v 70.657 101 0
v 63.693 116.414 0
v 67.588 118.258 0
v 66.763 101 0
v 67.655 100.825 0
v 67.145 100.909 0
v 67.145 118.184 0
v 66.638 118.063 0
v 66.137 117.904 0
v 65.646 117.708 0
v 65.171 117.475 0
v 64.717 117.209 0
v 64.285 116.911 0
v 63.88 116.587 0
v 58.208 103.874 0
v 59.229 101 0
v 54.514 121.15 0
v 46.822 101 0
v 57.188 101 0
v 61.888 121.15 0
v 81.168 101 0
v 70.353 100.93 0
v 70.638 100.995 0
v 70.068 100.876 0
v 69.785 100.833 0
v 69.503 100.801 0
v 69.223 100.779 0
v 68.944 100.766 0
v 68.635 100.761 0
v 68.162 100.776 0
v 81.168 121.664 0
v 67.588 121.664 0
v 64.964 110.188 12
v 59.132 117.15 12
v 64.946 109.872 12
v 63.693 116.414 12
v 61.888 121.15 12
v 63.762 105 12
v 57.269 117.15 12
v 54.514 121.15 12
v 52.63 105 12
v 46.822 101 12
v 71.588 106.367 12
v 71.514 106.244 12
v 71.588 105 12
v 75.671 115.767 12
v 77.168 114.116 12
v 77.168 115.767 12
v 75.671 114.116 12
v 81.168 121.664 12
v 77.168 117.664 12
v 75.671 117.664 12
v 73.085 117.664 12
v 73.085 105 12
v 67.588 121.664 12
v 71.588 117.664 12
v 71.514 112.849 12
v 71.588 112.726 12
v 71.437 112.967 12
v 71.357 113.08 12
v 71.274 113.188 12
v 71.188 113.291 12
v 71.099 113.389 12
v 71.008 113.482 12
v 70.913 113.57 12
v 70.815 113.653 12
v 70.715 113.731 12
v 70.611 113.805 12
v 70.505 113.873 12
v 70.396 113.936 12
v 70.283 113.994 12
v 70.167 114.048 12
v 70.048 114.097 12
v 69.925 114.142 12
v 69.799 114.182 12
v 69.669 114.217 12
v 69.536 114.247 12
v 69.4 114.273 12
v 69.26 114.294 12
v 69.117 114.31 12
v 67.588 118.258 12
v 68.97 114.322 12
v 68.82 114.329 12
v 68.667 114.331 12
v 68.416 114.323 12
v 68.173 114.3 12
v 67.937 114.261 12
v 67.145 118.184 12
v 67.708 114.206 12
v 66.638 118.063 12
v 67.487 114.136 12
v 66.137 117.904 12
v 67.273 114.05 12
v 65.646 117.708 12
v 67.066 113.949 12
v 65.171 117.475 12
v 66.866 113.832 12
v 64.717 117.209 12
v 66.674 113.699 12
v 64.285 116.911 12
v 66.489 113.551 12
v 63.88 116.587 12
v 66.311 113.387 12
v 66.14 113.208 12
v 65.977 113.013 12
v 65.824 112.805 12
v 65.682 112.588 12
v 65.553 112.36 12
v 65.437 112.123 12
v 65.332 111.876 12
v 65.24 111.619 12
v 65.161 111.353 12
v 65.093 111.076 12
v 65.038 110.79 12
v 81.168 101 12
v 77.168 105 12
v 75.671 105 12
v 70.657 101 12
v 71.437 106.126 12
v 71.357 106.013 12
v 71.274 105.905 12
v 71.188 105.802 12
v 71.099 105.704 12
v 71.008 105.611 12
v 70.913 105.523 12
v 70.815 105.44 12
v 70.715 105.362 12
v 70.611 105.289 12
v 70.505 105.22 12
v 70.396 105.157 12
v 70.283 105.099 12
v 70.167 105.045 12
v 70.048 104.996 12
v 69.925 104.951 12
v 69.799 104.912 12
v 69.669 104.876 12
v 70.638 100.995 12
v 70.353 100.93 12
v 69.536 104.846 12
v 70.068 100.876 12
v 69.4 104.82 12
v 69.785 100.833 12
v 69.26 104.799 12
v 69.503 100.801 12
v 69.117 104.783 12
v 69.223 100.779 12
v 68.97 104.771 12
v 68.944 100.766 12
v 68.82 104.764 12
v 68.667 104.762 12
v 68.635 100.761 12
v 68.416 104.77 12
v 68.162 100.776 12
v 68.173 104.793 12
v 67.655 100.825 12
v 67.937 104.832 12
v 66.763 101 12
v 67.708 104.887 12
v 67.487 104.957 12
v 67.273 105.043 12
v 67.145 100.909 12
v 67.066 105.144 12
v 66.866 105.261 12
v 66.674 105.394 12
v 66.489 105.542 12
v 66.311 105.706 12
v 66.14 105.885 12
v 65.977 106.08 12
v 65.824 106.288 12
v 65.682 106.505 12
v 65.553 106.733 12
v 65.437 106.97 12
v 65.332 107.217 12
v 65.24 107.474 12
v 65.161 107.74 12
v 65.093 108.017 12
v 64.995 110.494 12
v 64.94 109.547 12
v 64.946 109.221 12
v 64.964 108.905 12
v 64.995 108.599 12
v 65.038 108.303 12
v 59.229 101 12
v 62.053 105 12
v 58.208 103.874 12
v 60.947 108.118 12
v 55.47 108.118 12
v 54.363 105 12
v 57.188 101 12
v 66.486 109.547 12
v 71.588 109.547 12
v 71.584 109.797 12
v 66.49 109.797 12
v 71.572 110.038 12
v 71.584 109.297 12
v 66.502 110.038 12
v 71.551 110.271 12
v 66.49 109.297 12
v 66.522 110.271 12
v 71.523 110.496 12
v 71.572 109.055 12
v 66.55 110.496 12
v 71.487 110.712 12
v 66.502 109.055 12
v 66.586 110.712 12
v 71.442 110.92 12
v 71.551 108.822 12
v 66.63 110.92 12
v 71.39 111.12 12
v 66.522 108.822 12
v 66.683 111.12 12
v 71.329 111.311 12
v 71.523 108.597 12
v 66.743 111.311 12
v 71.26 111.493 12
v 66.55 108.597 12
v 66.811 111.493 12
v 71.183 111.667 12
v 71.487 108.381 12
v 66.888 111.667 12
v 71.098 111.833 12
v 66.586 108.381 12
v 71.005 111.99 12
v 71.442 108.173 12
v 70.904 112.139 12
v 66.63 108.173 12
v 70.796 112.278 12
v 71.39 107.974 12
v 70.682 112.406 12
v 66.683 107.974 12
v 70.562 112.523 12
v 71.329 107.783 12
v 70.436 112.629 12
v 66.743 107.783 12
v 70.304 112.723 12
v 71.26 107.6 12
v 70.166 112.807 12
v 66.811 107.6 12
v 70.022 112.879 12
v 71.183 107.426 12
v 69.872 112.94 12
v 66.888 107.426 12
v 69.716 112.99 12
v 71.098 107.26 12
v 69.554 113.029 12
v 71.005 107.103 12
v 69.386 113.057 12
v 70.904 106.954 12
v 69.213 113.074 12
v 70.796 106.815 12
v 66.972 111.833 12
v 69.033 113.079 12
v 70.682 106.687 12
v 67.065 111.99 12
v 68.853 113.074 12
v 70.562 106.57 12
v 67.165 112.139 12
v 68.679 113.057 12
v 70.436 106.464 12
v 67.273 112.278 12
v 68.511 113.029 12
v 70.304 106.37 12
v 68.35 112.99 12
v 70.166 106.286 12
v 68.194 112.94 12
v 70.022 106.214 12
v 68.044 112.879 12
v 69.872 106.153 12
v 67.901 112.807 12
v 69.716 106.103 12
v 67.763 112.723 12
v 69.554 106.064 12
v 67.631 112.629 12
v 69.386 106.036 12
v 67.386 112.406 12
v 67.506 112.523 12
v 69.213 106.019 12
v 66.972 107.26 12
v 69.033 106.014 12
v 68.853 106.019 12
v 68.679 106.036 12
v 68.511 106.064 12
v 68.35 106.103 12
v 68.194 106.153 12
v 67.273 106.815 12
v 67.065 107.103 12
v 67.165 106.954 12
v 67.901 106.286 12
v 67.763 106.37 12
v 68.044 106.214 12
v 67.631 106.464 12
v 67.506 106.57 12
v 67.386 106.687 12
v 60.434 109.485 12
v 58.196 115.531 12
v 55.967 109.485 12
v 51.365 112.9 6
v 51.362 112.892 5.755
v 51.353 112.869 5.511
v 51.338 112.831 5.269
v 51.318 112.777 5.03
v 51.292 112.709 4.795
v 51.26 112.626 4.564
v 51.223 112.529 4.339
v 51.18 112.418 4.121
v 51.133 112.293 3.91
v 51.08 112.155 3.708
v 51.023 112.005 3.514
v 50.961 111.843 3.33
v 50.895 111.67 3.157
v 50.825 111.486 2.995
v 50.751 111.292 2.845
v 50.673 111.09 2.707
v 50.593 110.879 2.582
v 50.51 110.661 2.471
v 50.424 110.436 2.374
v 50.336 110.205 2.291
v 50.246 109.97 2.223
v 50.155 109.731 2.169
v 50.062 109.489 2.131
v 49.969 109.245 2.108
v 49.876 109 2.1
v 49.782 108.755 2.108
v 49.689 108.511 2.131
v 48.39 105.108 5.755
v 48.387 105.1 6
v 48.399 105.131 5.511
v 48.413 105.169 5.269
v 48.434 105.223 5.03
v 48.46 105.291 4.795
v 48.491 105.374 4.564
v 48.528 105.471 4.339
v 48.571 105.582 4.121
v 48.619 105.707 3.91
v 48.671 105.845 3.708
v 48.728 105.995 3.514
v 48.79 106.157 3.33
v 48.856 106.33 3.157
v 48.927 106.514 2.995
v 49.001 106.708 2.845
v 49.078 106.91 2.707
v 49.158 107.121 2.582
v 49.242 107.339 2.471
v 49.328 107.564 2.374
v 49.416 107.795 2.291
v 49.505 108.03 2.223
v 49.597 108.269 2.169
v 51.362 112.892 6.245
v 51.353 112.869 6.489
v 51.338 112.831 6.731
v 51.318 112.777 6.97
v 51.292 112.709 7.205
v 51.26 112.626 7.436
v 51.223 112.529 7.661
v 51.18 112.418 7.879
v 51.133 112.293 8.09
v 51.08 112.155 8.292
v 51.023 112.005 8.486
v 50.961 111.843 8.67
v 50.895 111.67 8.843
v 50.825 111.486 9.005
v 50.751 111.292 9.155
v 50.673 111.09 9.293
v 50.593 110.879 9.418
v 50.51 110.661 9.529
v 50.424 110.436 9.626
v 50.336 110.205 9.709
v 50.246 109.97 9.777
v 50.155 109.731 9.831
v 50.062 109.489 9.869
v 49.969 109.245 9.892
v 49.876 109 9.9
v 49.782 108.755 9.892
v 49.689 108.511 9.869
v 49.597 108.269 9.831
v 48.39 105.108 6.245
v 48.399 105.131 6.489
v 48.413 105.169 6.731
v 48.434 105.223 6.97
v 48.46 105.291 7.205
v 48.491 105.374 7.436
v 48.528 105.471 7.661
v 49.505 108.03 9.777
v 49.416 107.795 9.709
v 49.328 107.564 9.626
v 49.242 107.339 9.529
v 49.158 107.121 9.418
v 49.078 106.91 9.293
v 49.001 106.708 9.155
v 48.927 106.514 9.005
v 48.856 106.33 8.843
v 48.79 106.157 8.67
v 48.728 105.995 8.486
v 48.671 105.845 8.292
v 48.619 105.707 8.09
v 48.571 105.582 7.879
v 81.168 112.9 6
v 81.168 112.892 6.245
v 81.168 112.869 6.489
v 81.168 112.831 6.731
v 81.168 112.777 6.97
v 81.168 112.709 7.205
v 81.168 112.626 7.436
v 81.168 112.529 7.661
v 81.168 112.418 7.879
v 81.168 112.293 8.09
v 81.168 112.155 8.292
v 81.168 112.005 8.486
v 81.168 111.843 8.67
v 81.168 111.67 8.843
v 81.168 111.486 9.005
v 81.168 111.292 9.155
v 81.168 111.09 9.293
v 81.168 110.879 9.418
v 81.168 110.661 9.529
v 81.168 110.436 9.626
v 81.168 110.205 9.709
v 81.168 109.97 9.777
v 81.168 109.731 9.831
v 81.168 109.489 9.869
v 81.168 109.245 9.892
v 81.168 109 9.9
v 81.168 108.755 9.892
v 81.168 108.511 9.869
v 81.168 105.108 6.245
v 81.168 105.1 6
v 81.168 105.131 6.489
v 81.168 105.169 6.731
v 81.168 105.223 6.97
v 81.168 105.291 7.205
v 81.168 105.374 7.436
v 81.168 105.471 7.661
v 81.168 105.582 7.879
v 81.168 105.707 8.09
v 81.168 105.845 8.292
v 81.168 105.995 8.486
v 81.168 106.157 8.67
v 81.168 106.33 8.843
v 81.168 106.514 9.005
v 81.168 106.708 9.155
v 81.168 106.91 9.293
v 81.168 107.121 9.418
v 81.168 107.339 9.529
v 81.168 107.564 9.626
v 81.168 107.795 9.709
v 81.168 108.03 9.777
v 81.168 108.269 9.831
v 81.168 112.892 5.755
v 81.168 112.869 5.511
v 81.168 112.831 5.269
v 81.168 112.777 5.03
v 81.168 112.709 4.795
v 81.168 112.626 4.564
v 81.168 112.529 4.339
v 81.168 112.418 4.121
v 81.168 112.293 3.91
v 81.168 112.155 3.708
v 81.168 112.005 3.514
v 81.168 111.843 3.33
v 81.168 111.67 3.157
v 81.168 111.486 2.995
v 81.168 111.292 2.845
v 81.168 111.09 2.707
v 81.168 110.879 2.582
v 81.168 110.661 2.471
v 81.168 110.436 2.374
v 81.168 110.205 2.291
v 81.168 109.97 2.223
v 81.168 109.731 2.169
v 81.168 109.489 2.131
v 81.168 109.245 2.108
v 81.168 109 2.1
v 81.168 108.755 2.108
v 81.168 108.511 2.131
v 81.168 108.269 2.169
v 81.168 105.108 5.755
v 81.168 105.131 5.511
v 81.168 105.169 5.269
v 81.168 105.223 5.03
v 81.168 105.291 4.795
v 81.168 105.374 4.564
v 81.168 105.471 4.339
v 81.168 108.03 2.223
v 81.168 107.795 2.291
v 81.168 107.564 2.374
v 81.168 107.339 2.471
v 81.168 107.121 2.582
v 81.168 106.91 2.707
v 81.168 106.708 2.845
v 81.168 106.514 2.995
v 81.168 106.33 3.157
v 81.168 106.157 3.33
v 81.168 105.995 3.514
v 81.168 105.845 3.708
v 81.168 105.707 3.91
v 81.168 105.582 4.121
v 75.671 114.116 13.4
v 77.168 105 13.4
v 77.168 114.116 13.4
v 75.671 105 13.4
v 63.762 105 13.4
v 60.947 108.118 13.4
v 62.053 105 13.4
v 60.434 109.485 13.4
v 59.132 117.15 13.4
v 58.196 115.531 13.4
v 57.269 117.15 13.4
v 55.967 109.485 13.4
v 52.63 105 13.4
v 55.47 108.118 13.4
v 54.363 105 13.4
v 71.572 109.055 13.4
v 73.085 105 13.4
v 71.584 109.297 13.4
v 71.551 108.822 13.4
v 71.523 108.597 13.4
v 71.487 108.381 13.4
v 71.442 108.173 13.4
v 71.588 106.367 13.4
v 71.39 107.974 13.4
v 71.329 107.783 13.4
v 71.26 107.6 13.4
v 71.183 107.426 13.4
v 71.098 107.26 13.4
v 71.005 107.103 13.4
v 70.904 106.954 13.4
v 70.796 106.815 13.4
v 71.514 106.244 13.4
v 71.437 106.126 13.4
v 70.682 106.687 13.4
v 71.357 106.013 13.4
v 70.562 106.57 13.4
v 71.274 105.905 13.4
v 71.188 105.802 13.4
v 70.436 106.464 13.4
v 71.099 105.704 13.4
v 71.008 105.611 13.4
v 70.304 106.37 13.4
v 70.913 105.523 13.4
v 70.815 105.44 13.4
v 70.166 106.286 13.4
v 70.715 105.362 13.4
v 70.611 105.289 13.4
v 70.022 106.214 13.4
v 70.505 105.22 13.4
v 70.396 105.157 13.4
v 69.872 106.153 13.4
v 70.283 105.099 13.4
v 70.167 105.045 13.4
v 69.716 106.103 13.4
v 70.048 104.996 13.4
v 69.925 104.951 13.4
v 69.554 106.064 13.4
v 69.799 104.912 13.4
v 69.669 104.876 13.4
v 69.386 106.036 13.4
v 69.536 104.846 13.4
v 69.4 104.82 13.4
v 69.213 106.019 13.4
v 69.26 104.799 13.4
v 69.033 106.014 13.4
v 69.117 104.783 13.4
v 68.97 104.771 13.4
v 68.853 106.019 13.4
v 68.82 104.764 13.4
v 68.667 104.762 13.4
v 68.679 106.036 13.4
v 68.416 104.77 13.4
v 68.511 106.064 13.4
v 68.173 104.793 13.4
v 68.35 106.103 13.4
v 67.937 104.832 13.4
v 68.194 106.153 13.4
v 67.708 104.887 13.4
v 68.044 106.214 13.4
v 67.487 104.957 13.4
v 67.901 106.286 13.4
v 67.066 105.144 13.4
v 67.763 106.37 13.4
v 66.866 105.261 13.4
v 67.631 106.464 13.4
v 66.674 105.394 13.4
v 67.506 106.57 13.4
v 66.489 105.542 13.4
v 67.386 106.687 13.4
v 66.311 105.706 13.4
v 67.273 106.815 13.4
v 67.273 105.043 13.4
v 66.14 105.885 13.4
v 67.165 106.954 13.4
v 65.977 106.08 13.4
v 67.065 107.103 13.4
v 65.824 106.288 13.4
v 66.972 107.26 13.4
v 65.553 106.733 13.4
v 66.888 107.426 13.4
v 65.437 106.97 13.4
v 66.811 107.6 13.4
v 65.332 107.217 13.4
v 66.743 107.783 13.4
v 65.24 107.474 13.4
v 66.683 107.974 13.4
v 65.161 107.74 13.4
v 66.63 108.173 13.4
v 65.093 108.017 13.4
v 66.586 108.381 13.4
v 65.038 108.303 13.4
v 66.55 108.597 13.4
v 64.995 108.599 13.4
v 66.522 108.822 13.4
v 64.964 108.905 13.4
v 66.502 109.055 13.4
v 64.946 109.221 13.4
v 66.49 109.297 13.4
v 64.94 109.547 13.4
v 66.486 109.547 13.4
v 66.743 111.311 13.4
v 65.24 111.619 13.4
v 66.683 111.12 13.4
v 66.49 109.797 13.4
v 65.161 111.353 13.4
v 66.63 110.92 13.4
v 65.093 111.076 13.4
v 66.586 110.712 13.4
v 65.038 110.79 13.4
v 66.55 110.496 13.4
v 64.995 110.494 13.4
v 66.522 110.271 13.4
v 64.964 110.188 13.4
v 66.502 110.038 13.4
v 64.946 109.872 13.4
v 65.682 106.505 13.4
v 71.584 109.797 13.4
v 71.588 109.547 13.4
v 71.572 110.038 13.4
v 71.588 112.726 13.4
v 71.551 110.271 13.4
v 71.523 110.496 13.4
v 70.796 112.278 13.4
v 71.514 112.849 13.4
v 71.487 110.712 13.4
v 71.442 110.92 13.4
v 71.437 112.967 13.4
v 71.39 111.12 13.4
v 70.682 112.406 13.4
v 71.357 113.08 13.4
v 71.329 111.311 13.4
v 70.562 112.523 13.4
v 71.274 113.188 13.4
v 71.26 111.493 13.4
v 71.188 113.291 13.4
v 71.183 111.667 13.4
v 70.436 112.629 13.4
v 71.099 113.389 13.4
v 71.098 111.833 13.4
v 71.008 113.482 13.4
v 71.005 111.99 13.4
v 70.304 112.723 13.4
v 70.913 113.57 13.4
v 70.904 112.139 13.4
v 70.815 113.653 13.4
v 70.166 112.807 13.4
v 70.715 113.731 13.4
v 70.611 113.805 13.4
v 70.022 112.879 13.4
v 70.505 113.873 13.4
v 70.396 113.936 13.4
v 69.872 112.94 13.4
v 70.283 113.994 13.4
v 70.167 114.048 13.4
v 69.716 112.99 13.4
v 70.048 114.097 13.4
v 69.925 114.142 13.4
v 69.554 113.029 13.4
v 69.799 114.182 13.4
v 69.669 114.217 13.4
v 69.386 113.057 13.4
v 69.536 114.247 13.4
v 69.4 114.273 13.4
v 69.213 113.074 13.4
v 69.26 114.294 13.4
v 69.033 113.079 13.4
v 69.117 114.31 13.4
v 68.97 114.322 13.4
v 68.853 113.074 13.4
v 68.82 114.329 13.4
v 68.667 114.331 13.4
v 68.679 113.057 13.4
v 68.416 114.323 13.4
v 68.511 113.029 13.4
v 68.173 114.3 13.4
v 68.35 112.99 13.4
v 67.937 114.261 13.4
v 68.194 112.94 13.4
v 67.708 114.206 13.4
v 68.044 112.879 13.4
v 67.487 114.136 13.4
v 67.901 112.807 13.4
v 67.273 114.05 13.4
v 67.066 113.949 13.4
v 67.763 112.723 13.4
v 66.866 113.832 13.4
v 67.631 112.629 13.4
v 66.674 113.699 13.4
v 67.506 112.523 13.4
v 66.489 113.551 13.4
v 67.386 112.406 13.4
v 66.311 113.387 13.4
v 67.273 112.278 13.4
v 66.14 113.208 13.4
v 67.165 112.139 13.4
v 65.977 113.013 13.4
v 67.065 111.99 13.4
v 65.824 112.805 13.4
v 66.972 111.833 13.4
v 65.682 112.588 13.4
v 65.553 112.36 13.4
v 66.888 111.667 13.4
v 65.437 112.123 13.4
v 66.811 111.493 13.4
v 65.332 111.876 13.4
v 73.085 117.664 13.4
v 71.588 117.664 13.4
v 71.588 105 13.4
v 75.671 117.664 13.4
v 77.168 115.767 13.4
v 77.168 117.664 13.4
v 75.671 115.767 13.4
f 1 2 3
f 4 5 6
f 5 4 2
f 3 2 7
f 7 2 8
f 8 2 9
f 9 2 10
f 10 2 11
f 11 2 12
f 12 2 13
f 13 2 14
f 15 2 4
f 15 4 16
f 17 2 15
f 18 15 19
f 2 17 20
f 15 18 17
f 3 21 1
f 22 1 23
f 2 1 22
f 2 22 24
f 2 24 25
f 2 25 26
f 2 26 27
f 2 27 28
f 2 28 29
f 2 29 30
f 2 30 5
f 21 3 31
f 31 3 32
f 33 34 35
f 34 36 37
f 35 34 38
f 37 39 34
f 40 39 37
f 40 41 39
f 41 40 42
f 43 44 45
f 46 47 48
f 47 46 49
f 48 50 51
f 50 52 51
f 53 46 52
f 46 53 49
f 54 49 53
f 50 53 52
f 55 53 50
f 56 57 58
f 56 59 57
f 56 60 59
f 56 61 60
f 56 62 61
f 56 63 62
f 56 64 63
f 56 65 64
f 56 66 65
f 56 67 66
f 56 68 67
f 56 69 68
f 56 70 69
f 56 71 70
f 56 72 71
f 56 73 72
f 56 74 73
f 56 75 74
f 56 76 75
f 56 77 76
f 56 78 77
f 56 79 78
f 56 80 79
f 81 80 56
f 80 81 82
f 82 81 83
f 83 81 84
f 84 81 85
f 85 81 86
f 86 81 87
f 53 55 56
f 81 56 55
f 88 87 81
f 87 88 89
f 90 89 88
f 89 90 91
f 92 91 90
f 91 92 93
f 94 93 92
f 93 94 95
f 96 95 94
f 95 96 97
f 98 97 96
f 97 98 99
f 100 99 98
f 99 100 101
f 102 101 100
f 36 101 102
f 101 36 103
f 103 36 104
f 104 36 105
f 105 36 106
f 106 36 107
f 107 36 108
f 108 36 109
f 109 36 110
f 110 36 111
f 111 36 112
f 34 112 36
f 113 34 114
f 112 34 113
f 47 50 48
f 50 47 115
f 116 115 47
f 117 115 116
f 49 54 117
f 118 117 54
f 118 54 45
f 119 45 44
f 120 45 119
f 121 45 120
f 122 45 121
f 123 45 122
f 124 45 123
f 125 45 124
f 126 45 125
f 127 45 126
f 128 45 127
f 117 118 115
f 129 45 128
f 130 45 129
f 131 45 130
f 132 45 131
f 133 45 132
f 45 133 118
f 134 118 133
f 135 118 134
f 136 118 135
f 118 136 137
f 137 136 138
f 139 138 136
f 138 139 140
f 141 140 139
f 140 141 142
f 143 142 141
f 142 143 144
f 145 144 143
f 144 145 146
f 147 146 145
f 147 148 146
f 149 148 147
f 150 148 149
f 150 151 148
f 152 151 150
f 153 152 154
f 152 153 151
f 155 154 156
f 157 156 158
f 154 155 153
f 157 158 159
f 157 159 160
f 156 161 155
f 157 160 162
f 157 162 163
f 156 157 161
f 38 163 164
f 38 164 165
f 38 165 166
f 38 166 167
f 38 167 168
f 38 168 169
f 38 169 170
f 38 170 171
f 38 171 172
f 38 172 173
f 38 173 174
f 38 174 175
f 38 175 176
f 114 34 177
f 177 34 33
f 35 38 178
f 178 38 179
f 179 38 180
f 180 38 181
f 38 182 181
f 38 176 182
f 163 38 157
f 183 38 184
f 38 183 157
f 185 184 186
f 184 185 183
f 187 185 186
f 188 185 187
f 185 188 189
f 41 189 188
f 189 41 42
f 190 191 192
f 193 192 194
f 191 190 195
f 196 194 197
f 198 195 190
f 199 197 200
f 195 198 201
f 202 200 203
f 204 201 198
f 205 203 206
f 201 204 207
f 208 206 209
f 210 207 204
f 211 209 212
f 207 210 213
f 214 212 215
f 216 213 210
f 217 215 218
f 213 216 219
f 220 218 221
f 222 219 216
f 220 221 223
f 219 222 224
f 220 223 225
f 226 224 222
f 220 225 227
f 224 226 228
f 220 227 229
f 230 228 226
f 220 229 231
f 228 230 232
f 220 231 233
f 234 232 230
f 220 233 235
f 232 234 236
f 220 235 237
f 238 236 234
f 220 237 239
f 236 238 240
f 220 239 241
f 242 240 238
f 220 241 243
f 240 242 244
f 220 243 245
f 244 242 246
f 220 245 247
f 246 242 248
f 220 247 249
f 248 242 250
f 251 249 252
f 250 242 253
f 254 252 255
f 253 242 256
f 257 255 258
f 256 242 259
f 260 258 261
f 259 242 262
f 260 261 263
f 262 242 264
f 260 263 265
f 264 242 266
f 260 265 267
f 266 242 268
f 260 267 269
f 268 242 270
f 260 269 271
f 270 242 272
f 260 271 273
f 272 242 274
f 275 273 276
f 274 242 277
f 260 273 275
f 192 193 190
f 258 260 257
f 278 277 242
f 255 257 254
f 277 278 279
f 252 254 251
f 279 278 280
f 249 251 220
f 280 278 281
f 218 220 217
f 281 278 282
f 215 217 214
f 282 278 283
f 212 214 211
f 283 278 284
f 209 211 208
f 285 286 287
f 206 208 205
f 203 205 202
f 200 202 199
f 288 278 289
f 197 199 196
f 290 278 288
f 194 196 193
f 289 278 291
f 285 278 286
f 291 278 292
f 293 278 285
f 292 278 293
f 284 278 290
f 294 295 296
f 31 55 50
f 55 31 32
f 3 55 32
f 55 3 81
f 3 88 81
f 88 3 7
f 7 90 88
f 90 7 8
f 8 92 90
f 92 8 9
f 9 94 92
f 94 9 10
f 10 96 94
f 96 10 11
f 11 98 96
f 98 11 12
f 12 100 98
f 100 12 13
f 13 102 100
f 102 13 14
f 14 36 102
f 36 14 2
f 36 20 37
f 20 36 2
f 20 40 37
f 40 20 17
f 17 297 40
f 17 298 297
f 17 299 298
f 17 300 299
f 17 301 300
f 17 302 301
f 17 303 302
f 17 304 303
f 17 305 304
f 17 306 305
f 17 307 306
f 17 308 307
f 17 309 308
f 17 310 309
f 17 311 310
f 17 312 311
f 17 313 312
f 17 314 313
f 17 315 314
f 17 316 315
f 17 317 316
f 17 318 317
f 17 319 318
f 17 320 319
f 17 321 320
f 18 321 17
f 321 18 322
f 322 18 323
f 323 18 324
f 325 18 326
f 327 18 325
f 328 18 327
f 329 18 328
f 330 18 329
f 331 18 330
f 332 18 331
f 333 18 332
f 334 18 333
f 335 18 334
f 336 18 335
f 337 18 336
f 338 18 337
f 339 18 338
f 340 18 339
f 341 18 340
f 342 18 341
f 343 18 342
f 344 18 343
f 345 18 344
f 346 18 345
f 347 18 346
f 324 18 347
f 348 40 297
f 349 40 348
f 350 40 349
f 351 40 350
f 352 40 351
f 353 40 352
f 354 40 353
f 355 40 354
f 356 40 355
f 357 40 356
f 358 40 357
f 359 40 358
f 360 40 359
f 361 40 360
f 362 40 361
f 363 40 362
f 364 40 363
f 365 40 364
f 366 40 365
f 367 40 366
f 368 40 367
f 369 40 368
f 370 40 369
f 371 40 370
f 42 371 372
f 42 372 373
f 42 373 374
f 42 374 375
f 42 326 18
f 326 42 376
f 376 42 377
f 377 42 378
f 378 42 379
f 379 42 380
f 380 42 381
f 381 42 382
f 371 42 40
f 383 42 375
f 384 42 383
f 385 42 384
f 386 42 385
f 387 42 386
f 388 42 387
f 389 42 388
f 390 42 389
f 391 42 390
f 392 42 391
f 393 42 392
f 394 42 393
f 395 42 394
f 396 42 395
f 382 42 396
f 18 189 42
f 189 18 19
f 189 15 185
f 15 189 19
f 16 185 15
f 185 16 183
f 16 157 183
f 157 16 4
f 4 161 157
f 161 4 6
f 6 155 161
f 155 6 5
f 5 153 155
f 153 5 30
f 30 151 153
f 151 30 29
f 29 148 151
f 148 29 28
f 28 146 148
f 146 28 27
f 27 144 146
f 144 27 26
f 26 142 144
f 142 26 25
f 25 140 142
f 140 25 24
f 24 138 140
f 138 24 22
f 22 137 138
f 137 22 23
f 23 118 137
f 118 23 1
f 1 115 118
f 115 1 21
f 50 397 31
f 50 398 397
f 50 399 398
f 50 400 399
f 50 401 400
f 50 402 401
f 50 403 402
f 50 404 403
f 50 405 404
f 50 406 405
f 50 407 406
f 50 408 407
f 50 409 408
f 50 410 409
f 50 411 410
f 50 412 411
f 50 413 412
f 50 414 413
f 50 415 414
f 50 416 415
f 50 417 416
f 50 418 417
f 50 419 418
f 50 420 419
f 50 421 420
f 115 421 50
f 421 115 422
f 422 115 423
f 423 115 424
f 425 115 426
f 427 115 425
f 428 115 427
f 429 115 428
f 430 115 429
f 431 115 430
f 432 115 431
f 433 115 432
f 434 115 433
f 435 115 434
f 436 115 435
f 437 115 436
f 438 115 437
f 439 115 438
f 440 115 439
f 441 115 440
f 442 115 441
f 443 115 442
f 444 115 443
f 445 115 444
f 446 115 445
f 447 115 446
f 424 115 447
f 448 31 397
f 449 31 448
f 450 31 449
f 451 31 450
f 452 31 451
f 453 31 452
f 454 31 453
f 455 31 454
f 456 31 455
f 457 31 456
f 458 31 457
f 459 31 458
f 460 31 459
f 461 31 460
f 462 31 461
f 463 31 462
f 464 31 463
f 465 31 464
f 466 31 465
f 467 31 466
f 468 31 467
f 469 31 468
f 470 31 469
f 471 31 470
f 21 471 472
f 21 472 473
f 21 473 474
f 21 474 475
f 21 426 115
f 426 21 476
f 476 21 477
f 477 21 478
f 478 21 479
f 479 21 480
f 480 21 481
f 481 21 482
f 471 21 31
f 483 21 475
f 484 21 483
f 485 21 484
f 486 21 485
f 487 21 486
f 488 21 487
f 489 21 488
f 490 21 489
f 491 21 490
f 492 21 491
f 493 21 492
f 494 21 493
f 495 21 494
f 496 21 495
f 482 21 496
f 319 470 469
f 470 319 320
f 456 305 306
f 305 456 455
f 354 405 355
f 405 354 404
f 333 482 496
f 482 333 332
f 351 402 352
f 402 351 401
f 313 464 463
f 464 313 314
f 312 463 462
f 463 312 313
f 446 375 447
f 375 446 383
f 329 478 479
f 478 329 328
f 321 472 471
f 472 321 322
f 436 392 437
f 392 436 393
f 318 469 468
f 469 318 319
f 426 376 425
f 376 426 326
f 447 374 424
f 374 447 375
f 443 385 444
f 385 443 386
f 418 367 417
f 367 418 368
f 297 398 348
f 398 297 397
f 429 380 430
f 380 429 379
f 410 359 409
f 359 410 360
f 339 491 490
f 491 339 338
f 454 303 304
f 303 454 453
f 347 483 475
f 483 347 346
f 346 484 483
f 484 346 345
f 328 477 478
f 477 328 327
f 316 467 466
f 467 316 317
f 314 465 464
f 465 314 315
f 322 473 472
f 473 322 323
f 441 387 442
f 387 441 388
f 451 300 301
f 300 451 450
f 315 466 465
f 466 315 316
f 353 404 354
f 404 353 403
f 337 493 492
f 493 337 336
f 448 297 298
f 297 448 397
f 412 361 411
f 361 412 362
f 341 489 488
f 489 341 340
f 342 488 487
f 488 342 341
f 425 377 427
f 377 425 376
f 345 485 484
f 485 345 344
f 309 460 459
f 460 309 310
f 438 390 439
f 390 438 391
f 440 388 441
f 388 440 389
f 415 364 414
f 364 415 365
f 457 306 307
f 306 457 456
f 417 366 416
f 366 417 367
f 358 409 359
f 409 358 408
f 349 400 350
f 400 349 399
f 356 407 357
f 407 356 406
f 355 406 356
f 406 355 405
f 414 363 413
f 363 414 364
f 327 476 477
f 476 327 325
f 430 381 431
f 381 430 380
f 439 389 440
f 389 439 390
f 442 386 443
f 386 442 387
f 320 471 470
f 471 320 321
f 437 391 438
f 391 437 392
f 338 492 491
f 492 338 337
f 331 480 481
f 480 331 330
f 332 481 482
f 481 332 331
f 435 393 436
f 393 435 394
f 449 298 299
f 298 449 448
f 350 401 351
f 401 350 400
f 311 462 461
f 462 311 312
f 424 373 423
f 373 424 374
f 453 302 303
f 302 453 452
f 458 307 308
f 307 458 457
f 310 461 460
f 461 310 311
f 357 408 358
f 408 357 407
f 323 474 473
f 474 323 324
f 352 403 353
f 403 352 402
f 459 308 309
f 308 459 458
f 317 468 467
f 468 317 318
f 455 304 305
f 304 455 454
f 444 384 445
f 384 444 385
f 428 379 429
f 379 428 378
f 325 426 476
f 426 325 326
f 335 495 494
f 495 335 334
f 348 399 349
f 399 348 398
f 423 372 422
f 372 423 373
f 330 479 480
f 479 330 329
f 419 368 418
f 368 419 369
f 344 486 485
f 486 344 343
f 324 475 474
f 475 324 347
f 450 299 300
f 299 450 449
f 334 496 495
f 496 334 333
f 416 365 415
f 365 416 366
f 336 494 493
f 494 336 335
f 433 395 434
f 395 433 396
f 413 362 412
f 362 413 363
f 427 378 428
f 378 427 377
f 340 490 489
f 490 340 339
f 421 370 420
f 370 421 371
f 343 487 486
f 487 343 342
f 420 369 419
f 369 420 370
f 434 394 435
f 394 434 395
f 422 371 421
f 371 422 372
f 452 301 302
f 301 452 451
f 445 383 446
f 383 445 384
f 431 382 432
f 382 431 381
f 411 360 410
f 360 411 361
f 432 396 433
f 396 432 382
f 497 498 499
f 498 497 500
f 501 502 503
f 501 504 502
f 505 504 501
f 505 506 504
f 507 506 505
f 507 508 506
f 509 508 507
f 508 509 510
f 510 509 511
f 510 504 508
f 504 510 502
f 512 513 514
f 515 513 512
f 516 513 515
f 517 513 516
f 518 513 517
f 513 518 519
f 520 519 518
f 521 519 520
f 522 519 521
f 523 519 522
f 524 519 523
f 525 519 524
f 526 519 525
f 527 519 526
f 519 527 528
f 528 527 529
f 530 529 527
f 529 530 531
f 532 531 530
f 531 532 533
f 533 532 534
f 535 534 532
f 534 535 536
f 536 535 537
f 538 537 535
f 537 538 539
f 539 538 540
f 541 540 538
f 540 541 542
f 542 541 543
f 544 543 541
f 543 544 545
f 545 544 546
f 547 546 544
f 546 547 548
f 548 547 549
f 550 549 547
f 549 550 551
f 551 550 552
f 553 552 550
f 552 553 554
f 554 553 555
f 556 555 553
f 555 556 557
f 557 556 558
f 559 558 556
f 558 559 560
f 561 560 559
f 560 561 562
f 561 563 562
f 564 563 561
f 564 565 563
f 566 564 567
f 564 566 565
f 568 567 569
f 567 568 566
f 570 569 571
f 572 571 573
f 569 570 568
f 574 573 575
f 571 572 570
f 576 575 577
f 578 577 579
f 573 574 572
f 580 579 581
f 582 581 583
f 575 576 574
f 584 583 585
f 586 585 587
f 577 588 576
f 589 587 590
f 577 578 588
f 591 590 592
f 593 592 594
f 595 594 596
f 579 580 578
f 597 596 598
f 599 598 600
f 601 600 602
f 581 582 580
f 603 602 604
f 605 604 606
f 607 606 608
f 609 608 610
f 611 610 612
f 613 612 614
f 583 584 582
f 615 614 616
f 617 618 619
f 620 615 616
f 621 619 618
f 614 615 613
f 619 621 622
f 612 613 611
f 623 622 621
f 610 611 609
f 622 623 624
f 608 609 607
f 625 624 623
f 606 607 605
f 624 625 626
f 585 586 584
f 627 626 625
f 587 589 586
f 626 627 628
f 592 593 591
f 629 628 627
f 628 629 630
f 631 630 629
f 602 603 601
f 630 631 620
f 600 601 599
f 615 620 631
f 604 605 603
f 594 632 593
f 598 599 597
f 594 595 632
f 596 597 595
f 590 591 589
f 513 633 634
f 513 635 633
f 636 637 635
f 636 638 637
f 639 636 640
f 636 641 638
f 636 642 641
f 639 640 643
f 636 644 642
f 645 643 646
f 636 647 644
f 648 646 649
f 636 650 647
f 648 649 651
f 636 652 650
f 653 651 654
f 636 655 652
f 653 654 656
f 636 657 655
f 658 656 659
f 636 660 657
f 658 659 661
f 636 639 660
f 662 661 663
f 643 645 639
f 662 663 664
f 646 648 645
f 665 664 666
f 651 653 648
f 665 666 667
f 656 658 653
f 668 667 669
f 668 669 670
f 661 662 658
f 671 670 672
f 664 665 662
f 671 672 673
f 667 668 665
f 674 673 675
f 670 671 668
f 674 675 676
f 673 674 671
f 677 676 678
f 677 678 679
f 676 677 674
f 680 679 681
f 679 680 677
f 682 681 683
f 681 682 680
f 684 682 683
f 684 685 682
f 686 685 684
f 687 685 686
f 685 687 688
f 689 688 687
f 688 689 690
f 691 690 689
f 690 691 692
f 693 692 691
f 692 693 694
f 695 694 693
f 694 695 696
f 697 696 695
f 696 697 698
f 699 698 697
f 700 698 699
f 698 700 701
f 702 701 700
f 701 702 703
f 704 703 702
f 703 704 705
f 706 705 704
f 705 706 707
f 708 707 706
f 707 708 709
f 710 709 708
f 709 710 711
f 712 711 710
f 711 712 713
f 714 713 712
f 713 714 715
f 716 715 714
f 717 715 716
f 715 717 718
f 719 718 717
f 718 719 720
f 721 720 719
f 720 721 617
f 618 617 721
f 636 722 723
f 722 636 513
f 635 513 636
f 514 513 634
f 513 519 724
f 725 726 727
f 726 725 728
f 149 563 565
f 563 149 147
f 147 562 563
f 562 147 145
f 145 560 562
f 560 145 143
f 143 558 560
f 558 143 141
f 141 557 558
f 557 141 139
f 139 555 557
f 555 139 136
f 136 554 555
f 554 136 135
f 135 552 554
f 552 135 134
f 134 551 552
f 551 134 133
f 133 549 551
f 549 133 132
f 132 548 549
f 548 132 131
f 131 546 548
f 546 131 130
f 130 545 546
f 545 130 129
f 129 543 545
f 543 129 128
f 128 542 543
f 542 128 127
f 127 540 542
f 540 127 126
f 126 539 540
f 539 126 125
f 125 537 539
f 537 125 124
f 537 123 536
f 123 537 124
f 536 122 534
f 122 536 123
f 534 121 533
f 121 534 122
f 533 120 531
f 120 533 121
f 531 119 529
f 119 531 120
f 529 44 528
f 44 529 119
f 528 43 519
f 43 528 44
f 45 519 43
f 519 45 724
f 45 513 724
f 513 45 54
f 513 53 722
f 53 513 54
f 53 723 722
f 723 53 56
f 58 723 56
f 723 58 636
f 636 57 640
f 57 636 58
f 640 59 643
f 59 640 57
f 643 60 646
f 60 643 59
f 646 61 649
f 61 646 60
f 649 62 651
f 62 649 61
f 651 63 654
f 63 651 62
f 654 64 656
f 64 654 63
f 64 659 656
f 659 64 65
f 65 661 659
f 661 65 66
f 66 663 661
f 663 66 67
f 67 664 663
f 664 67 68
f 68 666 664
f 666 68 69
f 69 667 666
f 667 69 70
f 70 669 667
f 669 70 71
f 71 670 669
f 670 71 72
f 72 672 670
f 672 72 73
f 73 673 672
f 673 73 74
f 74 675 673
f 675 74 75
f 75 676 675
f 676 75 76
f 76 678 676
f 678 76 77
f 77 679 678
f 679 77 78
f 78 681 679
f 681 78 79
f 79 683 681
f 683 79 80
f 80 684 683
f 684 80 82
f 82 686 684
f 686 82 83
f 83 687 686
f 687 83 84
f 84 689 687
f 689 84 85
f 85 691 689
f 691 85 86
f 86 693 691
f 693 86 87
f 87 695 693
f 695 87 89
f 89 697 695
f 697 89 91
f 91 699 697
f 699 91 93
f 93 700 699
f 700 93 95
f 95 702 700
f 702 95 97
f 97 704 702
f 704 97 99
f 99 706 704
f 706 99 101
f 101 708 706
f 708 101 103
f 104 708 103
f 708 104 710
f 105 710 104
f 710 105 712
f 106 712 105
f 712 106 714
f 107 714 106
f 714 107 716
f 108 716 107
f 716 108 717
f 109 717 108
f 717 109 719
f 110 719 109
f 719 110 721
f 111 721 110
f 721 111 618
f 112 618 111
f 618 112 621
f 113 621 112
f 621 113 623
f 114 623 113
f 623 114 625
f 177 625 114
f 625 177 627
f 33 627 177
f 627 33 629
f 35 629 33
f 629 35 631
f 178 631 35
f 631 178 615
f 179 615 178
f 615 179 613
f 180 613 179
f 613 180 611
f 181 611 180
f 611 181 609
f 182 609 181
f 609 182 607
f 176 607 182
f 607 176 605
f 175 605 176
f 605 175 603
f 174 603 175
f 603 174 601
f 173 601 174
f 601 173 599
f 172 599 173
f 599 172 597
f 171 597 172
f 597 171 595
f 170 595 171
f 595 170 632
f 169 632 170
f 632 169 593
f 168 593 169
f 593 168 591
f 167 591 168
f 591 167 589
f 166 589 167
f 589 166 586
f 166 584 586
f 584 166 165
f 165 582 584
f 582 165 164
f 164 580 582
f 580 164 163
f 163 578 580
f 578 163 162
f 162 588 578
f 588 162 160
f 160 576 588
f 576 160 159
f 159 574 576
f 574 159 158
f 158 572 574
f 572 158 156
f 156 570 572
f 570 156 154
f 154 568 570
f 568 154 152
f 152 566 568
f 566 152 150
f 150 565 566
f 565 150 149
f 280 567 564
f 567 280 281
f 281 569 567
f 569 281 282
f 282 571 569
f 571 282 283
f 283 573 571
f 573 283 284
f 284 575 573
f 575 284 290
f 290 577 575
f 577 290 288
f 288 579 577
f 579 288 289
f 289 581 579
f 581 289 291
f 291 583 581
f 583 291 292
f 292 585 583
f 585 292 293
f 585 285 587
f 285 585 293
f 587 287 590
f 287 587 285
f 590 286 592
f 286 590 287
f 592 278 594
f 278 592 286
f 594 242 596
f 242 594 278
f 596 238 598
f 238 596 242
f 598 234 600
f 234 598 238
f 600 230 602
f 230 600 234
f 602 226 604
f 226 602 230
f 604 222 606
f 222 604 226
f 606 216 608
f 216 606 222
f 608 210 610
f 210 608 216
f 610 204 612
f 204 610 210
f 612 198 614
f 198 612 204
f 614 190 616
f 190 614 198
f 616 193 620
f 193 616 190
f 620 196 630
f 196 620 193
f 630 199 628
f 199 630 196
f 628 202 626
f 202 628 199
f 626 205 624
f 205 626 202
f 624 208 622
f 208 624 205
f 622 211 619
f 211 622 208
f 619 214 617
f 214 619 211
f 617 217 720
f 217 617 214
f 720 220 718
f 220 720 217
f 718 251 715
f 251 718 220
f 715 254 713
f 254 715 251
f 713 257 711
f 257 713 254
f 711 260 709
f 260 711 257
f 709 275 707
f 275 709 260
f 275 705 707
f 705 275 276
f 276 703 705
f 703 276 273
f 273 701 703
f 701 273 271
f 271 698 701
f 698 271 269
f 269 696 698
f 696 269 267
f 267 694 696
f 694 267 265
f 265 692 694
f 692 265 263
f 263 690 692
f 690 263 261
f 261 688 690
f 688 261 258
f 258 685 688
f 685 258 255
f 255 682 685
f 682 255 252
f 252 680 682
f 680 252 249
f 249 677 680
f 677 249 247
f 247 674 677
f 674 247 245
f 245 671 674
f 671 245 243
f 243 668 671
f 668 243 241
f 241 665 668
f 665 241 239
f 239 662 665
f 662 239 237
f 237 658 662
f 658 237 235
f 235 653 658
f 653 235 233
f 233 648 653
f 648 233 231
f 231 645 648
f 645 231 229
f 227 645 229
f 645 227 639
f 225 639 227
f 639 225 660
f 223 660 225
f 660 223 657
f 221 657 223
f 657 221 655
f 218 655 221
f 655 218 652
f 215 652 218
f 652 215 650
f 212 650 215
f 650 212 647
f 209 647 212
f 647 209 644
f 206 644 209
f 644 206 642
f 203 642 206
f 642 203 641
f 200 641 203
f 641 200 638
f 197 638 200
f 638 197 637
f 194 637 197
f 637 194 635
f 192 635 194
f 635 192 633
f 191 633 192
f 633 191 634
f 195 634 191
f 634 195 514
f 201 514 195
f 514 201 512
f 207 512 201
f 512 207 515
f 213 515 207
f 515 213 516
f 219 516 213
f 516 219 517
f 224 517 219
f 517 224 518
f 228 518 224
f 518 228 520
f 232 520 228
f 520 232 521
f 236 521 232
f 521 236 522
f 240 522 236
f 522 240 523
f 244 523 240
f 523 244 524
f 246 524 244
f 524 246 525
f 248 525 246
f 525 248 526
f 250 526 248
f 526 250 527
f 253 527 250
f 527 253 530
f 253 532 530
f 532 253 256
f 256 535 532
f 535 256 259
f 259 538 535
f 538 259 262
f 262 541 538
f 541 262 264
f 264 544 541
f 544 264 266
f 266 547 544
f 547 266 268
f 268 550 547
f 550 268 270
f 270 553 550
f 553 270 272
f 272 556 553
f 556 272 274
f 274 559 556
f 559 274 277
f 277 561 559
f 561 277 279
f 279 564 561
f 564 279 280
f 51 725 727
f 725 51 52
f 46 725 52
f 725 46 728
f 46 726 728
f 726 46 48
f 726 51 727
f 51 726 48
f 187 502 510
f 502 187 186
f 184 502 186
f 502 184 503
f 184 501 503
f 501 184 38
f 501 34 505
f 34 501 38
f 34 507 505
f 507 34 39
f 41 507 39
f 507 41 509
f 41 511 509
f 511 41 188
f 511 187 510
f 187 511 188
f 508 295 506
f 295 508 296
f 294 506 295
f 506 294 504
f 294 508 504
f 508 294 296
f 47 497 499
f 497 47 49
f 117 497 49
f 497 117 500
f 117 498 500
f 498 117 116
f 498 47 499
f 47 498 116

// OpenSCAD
// =========================================================================
//   MULTI-NAME TOPPER COMBINED VERSION (Auto-detect Ligatures + Calibrated Spacing)
// =========================================================================
// Jumlah kolom grid
grid_cols = 2;
/* [Nama] */
nama_1  = "Adi";
nama_2  = "";
nama_3  = "";
nama_4  = "";
nama_5  = "";
nama_6  = "";
nama_7  = "";
nama_8  = "";
nama_9  = "";
nama_10 = "";

/* [Warna] */
base_color_name    = "Peak Green"; // [Yellow, White, Sky Blue, Red, Peak Green, Orange, Grape Purple, Black, Beige, Barbie Pink]
letters_color_name = "White";      // [Yellow, White, Sky Blue, Red, Peak Green, Orange, Grape Purple, Black, Beige, Barbie Pink]

/* [Settings] */
font_name        = "Bagel Fat One"; // font [Bagel Fat One, Chewy, Courgette, Dancing Script, Lemon, Lobster, Pacifico, Playfair, Lily Script One, Sacramento, Bubblegum Sans, DynaPuff, Alkatra, Archivo, Sour Gummy, Shrikhand]
letter_height    = 12;
letter_thickness = 1.4;
base_height      = 12;
outline_margin   = 4;
hole_orientation = "FRONTBACK"; // ["FRONTBACK", "TOPBOTTOM"]
hole_diameter    = 7.8;
hole_length      = 200;
hole_x           = 21;
hole_y           = 4;
hole_z           = base_height / 2;

// Width scale for individual character layout (used when ligature is detected)
Width_Scale       = 1.0;   // [0.8:0.02:1.5]
// Extra space between characters for ligatures ff / fi / fl
Ligature_Extra    = 1.5;   // [0:0.1:5]

/* [Font Spacing Calibration] */
// Metode perhitungan jarak (0 = Metode Asli, 1 = Metode Rata-rata/Average)
Spacing_Method    = 0; // [0: Asli, 1: Rata-Rata]

// Jenis tabel lebar huruf (0 = Kalibrasi v6 Teroptimasi, 1 = Kustom 0.70)
Table_Type        = 0; // [0: Kalibrasi v6, 1: Kustom 0.70]

/* [Layout Grid] */
// Ukuran bed printer (mm)
bed_x = 235;
bed_y = 235;



// Jarak antar nama (mm)
gap_x = 10;
gap_y = 10;

// Estimasi lebar & tinggi per slot nama (mm)
slot_w = 60;
slot_h = 25;

/* [Direction/Alignment] */
rtl         = false;
text_halign = rtl ? "right" : "left";

/* ===============================
   COLOR MAPPING (NAME → HEX)
   =============================== */
function getColor(name) =
    name == "Yellow"       ? "#FFD700" :
    name == "White"        ? "#FFFFFF" :
    name == "Sky Blue"     ? "#87CEEB" :
    name == "Red"          ? "#FF0000" :
    name == "Peak Green"   ? "#00C853" :
    name == "Orange"       ? "#FF6A00" :
    name == "Grape Purple" ? "#6A0DAD" :
    name == "Black"        ? "#000000" :
    name == "Beige"        ? "#F5F5DC" :
    name == "Barbie Pink"  ? "#FF69B4" :
    "#FFFFFF";

base_color    = getColor(base_color_name);
letters_color = getColor(letters_color_name);
$fn = 100;

// Alias to match keychain calibration variable names
Font_Size = letter_height;

// ─────────────────────────────────────────────
// LOOKUP TABLE FOR CHARACTER WIDTHS
// ─────────────────────────────────────────────
function char_w_raw(c, type) =
    type == 0 ? (
        // Kalibrasi v6 Teroptimasi (Fiks Pilihan User)
        c=="A" ? 0.96 : c=="B" ? 0.80 : c=="C" ? 0.84 :
        c=="D" ? 0.84 : c=="E" ? 0.86 : c=="F" ? 0.76 :
        c=="G" ? 0.86 : c=="H" ? 0.93 : c=="I" ? 0.4  :
        c=="J" ? 0.76 : c=="K" ? 0.92 : c=="L" ? 0.74 :
        c=="M" ? 1.20 : c=="N" ? 0.98 : c=="O" ? 0.90 :
        c=="P" ? 0.88 : c=="Q" ? 0.90 : c=="R" ? 0.92 :
        c=="S" ? 0.90 : c=="T" ? 0.74 : c=="U" ? 0.86 :
        c=="V" ? 0.84 : c=="W" ? 1.14 : c=="X" ? 0.80 :
        c=="Y" ? 0.78 : c=="Z" ? 0.78 :
        c=="a" ? 0.78 : c=="b" ? 0.76 : c=="c" ? 0.74 :
        c=="d" ? 0.84 : c=="e" ? 0.76 : c=="f" ? 0.54 :
        c=="g" ? 0.76 : c=="h" ? 0.78 : c=="i" ? 0.38 : // Dioptimasi agar huruf setelah 'i' tidak menempel
        c=="j" ? 0.44 : c=="k" ? 0.84 : c=="l" ? 0.38 : // Dioptimasi agar huruf setelah 'l' tidak menempel
        c=="m" ? 1.14 : c=="n" ? 0.78 : c=="o" ? 0.78 :
        c=="p" ? 0.76 : c=="q" ? 0.86 : c=="r" ? 0.70 : // Dioptimasi agar 'rn' tidak menempel
        c=="s" ? 0.76 : c=="t" ? 0.70 : c=="u" ? 0.84 : // Dioptimasi agar 'sh' tidak menempel
        c=="v" ? 0.74 : c=="w" ? 1.94 : c=="x" ? 0.70 :
        c=="y" ? 0.74 : c=="z" ? 0.80 : 
        c=="." ? 0.10 :
        c==" " ? 0.50 : 0.76
    ) : (
        // Kustom 0.70
        c=="A" ? 0.96 : c=="B" ? 0.80 : c=="C" ? 0.84 :
        c=="D" ? 0.84 : c=="E" ? 0.76 : c=="F" ? 0.76 :
        c=="G" ? 0.86 : c=="H" ? 0.86 : c=="I" ? 0.4  :
        c=="J" ? 0.56 : c=="K" ? 0.82 : c=="L" ? 0.74 :
        c=="M" ? 1.00 : c=="N" ? 0.98 : c=="O" ? 0.90 :
        c=="P" ? 0.78 : c=="Q" ? 0.90 : c=="R" ? 0.92 :
        c=="S" ? 0.76 : c=="T" ? 0.74 : c=="U" ? 0.86 :
        c=="V" ? 0.84 : c=="W" ? 1.04 : c=="X" ? 0.80 :
        c=="Y" ? 0.78 : c=="Z" ? 0.78 :
        c=="a" ? 0.78 : c=="b" ? 0.70 : c=="c" ? 0.70 :
        c=="d" ? 0.70 : c=="e" ? 0.70 : c=="f" ? 0.54 :
        c=="g" ? 0.70 : c=="h" ? 0.70 : c=="i" ? 0.36 :
        c=="j" ? 0.70 : c=="k" ? 0.70 : c=="l" ? 0.70 :
        c=="m" ? 0.70 : c=="n" ? 0.70 : c=="o" ? 0.70 :
        c=="p" ? 0.70 : c=="q" ? 0.70 : c=="r" ? 0.70 :
        c=="s" ? 0.70 : c=="t" ? 0.70 : c=="u" ? 0.70 :
        c=="v" ? 0.70 : c=="w" ? 0.70 : c=="x" ? 0.70 :
        c=="y" ? 0.70 : c=="z" ? 0.70 :
        c==" " ? 0.50 : 0.76
    );

function char_w(c) = char_w_raw(c, Table_Type);

// ─────────────────────────────────────────────
// DETEKSI & LOGIC LIGATURE
// ─────────────────────────────────────────────

function is_ligature(prev, cur) =
    prev == "f" && (cur == "f" || cur == "i" || cur == "l");

function cx(word, idx) =
    idx == 0 ? 0 :
    cx(word, idx-1)
    + (
        Spacing_Method == 0 ? 
        char_w(word[idx-1]) * Font_Size * Width_Scale : 
        ((char_w(word[idx-1]) + char_w(word[idx])) / 2) * Font_Size * Width_Scale
    )
    + (is_ligature(word[idx-1], word[idx]) ? Ligature_Extra : 0);

function get_word_width(word) =
    len(word) == 0 ? 0 :
    cx(word, len(word)-1) + char_w(word[len(word)-1]) * Font_Size * Width_Scale;

// ─────────────────────────────────────────────
// ALIGNMENT TEXT
// ─────────────────────────────────────────────
function align_offset() =
    text_halign == "left"   ? 0 :
    text_halign == "right"  ? 0 :
    0;

// Merender kata huruf demi huruf dengan baseline vertikal sejajar
module render_chars(word) {
    for (i = [0 : len(word) - 1]) {
        translate([cx(word, i), 0, 0])
            text(word[i], size = Font_Size, font = font_name, valign = "baseline");
    }
}

// Merender baris secara per-karakter agar perhitungan koordinat spasi 100% sinkron
module render_line(word) {
    align_shift = 
        text_halign == "center" ? -get_word_width(word) / 2 :
        text_halign == "right"  ? -get_word_width(word) :
        0;
    translate([align_shift, 0, 0])
        render_chars(word);
}

/* ===============================
   MODULES (TERKALIBRASI SECARA PER-KARAKTER)
   =============================== */
module base_with_tunnel(text_string) {
    difference() {
        linear_extrude(height = base_height)
            offset(delta = outline_margin)
                render_line(text_string);
                
        if (hole_orientation == "FRONTBACK") {
            translate([ 0, hole_y, hole_z ])
                rotate([ 0, 90, 0 ])
                    cylinder(d = hole_diameter, h = hole_length, center = true);
        }
        else if (hole_orientation == "TOPBOTTOM") {
            translate([ hole_x, 0, hole_z ])
                rotate([ 90, 0, 0 ])
                    cylinder(d = hole_diameter, h = hole_length, center = true);
        }
        else {
            echo("Error: hole_orientation must be \"FRONTBACK\" or \"TOPBOTTOM\".");
        }
    }
}

module raised_letters(text_string) {
    translate([ 0, 0, base_height ])
        linear_extrude(height = letter_thickness)
            render_line(text_string);
}

module name_topper(text_string) {
    color(base_color)    base_with_tunnel(text_string);
    color(letters_color) raised_letters(text_string);
}

/* ===============================
   GENERATE — grid layout, center di bed
   =============================== */
nama_all = [nama_1, nama_2, nama_3, nama_4, nama_5,
            nama_6, nama_7, nama_8, nama_9, nama_10];

// filter nama yang tidak kosong
filled = [for (n = nama_all) if (n != "") n];
total  = len(filled);

// hitung jumlah baris
grid_rows = ceil(total / grid_cols);

// total ukuran grid
total_w = grid_cols * slot_w + (grid_cols - 1) * gap_x;
total_h = grid_rows * slot_h + (grid_rows - 1) * gap_y;

// offset agar center di bed
start_x = (bed_x - total_w) / 2;
start_y = (bed_y - total_h) / 2;

for (idx = [0 : total - 1]) {
    col = idx % grid_cols;
    row = floor(idx / grid_cols);

    x = start_x + col * (slot_w + gap_x);
    y = start_y + (grid_rows - 1 - row) * (slot_h + gap_y); // baris pertama di atas

    translate([ x, y, 0 ])
        name_topper(filled[idx]);
}
